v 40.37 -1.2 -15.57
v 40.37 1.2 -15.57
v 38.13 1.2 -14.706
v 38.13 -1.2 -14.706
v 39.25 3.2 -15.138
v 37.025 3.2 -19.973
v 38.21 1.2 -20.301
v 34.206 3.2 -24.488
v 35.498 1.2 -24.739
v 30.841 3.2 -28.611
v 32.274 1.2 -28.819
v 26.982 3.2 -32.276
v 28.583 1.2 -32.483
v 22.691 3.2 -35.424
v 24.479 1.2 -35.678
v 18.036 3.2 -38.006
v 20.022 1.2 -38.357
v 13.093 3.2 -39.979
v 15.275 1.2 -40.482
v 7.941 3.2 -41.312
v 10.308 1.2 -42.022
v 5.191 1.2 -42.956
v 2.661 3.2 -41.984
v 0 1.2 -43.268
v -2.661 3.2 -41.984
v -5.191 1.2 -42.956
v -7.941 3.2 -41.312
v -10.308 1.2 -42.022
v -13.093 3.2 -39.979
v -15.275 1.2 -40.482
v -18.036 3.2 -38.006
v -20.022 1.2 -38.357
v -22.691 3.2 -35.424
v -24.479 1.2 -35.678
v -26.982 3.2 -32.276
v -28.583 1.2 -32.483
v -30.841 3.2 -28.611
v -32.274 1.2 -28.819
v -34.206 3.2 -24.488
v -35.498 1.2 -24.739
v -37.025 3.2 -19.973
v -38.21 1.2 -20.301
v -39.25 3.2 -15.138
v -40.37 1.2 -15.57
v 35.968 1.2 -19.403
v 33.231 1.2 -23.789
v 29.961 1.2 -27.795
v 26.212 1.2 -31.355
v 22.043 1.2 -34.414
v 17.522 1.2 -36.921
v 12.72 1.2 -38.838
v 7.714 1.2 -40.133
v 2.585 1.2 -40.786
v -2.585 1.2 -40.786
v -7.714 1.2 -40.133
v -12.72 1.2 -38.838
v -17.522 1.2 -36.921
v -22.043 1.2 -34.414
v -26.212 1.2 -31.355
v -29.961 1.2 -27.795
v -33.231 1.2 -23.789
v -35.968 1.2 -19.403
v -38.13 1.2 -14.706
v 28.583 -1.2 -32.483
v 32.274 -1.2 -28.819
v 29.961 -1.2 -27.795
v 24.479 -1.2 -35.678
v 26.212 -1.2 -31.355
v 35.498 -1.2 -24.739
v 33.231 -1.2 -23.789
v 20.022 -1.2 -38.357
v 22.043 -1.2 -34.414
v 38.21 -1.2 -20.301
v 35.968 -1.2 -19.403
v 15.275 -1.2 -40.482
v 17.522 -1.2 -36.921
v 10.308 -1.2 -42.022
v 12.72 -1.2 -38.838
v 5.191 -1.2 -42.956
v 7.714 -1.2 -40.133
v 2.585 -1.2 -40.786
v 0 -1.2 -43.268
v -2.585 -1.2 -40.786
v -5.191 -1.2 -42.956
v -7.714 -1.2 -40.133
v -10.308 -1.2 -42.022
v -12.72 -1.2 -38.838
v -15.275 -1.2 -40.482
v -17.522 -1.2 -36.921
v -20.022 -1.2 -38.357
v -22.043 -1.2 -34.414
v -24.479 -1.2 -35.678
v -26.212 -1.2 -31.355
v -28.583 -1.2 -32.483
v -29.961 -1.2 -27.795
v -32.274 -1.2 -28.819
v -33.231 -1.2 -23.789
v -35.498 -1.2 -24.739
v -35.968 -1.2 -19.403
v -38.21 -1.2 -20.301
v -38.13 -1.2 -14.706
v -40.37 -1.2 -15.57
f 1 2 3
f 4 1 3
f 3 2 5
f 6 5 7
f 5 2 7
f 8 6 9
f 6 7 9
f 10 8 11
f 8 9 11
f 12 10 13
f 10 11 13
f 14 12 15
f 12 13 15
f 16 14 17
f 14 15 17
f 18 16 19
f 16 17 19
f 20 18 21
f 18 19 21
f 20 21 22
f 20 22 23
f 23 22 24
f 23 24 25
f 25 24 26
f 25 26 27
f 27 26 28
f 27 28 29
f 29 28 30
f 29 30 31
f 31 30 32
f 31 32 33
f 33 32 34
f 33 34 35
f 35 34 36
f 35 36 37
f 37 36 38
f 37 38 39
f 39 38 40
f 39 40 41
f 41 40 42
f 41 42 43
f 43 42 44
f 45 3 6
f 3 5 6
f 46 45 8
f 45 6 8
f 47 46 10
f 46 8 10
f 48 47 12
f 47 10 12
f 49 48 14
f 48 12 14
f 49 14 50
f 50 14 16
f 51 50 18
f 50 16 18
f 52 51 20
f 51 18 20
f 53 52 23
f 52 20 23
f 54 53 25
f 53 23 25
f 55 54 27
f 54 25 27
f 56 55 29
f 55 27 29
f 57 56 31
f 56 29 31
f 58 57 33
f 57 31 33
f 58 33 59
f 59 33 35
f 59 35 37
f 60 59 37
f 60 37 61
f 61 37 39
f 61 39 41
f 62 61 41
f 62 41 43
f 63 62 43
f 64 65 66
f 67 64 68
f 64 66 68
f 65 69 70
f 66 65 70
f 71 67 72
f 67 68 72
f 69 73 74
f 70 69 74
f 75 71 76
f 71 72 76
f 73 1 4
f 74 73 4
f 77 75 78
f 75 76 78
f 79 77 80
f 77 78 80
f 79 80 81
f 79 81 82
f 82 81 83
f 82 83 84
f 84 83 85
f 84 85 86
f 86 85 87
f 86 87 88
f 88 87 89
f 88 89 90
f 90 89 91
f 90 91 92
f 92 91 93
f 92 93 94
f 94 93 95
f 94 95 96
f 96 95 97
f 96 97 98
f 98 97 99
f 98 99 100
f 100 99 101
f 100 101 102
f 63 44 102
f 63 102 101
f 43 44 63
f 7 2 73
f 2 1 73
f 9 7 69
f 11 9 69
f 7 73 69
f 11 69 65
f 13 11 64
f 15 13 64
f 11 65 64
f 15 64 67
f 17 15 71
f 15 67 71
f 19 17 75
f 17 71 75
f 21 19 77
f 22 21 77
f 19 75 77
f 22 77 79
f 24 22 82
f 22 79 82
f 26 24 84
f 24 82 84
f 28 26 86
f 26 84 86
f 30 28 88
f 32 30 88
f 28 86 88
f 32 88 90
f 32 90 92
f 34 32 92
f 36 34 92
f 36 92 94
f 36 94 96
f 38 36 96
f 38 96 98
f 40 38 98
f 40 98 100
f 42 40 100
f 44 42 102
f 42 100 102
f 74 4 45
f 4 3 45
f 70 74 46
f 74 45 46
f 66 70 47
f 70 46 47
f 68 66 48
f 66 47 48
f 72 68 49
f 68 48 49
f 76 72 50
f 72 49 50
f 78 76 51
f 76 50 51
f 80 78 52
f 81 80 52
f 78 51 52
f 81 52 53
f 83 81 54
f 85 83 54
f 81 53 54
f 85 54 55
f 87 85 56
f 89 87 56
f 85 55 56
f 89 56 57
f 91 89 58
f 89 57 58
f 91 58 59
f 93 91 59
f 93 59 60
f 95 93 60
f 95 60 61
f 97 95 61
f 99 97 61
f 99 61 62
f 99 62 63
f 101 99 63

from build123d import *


with BuildPart() as part:
    # Sweep1: sweep along a path in PropShadow
    with BuildLine(Plane(origin=(0, 0, 0), x_dir=(1, 0, 0), z_dir=(0, 1, 0))) as sweep1_path:
        ThreePointArc((39.25, 15.138227876), (0, 42.068140478), (-39.25, 15.138227876))
    # Sketch4 → Sweep1 (sweep)
    with BuildSketch(Plane(origin=(0, 0, 0), x_dir=(0.9330101010986988, 0, 0.3598501788908768), z_dir=(-0.3598501788908768, 0, 0.9330101010986988))):
        Polygon((-43.268140478, 1.2), (-42.068140478, 3.2), (-40.868140478, 1.2), (-40.868140478, -1.2), (-43.268140478, -1.2), align=None)
    sweep(path=sweep1_path.line)


solid = part.part
